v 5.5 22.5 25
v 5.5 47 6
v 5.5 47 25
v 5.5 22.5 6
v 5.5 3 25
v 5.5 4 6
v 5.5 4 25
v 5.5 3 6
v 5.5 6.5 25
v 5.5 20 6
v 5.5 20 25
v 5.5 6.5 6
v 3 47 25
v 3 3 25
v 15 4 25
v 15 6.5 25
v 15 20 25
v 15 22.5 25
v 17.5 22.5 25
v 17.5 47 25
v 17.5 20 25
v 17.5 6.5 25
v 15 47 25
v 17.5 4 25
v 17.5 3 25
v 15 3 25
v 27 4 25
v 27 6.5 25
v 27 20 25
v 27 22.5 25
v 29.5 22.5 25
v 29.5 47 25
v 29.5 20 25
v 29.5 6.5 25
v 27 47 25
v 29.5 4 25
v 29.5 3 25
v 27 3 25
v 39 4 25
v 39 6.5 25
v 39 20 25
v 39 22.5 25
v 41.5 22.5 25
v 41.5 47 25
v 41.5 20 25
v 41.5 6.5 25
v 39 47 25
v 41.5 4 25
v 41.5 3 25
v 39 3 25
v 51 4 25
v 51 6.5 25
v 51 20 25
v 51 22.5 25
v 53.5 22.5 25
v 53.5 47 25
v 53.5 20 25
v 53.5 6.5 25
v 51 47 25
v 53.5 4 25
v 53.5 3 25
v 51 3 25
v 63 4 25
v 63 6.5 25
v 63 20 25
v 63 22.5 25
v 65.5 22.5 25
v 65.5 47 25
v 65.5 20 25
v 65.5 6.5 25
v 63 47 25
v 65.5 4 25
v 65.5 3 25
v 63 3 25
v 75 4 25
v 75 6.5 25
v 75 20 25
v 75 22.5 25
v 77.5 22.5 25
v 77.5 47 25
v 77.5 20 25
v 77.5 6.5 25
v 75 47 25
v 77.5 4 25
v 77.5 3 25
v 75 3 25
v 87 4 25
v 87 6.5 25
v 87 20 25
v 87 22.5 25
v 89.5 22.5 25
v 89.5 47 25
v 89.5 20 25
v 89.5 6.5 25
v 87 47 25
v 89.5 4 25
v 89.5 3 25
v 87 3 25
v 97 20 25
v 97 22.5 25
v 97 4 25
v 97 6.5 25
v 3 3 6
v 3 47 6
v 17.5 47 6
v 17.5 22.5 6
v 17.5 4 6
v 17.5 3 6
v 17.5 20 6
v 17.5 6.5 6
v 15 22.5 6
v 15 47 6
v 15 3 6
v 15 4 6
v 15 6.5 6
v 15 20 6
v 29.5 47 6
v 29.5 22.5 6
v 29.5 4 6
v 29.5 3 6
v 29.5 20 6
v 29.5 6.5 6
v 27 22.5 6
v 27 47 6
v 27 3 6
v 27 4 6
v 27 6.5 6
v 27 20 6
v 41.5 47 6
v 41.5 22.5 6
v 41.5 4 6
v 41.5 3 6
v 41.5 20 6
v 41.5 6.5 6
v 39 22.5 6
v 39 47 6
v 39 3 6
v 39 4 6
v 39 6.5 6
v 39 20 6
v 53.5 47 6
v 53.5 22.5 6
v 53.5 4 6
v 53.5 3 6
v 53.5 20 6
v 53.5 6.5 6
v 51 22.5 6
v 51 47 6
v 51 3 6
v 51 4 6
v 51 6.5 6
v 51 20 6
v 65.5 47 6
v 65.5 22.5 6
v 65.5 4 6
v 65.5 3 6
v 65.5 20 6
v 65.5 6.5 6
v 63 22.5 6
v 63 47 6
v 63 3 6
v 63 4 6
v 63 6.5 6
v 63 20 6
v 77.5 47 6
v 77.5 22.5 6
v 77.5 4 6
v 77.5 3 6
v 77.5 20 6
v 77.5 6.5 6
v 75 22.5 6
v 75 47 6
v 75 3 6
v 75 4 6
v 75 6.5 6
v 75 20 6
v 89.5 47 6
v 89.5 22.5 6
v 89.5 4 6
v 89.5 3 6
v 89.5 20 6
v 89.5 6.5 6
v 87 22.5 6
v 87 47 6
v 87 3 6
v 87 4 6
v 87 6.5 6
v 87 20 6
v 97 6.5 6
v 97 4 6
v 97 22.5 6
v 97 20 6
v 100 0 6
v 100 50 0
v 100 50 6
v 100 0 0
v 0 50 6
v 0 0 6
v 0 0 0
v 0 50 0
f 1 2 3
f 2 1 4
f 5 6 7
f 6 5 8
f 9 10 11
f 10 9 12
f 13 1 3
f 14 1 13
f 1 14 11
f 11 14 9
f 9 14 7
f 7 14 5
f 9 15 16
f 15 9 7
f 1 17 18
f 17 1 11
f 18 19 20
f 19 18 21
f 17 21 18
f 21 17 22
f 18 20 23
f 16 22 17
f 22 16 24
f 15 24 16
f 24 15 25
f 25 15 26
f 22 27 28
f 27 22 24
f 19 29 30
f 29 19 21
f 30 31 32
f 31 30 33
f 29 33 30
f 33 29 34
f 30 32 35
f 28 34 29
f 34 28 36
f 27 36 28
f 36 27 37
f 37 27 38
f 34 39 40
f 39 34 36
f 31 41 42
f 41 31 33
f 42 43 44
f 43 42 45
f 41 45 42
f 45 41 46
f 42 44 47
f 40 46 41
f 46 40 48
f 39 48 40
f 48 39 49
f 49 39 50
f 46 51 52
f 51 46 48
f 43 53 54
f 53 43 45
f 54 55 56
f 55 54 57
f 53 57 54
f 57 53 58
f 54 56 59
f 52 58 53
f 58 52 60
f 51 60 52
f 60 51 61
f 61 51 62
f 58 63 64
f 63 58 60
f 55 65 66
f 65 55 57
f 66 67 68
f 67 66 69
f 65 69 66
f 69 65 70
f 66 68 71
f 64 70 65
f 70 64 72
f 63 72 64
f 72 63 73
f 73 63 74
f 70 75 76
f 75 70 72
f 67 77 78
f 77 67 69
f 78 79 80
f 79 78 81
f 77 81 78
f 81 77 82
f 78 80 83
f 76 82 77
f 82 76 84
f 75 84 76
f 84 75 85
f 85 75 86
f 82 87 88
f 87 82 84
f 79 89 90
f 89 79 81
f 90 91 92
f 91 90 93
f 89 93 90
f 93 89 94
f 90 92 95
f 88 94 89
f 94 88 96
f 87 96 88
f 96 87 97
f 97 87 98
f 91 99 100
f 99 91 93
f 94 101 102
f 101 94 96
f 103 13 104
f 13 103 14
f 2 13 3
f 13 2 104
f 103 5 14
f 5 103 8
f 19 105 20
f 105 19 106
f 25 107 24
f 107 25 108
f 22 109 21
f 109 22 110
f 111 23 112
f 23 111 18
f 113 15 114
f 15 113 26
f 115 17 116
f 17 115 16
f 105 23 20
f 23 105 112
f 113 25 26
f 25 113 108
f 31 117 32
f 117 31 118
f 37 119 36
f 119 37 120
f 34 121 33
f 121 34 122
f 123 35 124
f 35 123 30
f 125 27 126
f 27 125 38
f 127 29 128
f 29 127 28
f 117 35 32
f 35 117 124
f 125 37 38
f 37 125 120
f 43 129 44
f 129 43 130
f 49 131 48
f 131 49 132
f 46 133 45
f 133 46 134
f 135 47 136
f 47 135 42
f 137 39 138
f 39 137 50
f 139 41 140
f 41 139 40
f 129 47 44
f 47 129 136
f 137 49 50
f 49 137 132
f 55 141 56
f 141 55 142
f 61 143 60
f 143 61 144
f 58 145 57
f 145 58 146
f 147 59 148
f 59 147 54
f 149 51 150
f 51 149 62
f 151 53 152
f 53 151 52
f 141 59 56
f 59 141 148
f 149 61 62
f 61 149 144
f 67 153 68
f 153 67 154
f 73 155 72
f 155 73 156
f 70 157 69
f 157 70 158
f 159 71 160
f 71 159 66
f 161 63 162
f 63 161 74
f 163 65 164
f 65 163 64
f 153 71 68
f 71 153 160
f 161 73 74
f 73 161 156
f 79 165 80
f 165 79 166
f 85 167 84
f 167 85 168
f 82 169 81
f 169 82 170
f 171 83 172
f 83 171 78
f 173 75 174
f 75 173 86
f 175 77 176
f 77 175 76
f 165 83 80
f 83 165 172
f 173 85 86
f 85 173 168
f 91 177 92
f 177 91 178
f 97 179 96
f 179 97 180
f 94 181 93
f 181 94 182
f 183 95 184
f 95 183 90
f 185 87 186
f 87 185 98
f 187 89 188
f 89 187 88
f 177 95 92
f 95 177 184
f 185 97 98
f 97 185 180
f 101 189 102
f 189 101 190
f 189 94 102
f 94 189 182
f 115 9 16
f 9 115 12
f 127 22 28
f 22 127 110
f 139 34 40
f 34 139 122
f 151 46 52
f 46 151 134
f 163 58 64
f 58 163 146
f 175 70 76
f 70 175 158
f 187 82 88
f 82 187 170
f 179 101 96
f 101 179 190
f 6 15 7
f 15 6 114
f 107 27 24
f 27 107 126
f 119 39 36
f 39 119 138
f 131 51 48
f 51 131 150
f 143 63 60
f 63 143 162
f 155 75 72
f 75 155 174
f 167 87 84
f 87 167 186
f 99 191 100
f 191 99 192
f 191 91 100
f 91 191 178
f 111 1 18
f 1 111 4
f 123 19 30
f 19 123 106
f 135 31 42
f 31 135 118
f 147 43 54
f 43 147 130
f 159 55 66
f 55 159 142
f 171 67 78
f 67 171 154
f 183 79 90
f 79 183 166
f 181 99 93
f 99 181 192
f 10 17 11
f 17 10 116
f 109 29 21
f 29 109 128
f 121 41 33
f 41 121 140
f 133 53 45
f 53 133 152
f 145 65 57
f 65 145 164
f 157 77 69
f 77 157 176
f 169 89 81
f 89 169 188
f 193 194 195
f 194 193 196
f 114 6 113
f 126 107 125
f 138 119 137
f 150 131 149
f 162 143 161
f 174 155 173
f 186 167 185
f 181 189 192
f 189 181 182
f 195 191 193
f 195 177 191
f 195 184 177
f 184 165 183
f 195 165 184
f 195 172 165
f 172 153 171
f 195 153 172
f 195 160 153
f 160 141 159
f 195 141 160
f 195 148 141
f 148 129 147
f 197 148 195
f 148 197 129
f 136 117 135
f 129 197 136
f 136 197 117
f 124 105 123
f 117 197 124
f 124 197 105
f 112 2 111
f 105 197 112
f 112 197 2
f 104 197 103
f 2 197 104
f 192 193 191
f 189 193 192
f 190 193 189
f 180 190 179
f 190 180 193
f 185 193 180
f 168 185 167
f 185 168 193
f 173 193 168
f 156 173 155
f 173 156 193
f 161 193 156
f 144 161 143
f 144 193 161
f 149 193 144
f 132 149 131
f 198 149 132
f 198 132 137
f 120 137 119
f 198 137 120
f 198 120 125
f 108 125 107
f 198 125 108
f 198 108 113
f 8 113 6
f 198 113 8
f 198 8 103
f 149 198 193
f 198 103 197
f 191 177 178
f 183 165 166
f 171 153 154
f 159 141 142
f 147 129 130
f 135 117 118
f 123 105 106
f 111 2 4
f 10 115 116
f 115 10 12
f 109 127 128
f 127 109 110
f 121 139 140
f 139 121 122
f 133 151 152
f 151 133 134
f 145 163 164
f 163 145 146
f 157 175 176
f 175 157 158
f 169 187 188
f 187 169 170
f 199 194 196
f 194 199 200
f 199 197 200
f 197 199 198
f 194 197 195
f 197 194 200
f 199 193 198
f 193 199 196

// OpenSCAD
$fn = 32;

// ----------------------------------------------------------------------
// Heatsink: cross fin block
// ----------------------------------------------------------------------

// --- parameters (mm) ---
base_l = 100;             // base length, X
base_w = 50;              // base width, Y
base_t = 6;               // base plate thickness
fin_h = 20;               // fin height above the base
fin_t = 2.5;              // fin thickness
edge = 3;                 // margin from the base ends
pitch = 12;               // fin pitch
rib_pitch = 16;           // cross rib pitch

n_fins = floor((base_l - 2 * edge - fin_t) / pitch) + 1;  // fin count
total_h = base_t + fin_h - 1;  // overall height
n_ribs = floor((base_w - 2 * edge) / rib_pitch);  // rib count

union() {
  cube([base_l, base_w, base_t]);
  for (i = [0 : n_fins - 1])
    translate([edge + i * pitch, edge, base_t - 1])
      cube([fin_t, base_w - 2 * edge, fin_h]);
  for (i = [0 : n_ribs - 1])
    translate([edge, edge + 1 + i * rib_pitch, base_t - 1])
      cube([base_l - 2 * edge, fin_t, fin_h]);
}
